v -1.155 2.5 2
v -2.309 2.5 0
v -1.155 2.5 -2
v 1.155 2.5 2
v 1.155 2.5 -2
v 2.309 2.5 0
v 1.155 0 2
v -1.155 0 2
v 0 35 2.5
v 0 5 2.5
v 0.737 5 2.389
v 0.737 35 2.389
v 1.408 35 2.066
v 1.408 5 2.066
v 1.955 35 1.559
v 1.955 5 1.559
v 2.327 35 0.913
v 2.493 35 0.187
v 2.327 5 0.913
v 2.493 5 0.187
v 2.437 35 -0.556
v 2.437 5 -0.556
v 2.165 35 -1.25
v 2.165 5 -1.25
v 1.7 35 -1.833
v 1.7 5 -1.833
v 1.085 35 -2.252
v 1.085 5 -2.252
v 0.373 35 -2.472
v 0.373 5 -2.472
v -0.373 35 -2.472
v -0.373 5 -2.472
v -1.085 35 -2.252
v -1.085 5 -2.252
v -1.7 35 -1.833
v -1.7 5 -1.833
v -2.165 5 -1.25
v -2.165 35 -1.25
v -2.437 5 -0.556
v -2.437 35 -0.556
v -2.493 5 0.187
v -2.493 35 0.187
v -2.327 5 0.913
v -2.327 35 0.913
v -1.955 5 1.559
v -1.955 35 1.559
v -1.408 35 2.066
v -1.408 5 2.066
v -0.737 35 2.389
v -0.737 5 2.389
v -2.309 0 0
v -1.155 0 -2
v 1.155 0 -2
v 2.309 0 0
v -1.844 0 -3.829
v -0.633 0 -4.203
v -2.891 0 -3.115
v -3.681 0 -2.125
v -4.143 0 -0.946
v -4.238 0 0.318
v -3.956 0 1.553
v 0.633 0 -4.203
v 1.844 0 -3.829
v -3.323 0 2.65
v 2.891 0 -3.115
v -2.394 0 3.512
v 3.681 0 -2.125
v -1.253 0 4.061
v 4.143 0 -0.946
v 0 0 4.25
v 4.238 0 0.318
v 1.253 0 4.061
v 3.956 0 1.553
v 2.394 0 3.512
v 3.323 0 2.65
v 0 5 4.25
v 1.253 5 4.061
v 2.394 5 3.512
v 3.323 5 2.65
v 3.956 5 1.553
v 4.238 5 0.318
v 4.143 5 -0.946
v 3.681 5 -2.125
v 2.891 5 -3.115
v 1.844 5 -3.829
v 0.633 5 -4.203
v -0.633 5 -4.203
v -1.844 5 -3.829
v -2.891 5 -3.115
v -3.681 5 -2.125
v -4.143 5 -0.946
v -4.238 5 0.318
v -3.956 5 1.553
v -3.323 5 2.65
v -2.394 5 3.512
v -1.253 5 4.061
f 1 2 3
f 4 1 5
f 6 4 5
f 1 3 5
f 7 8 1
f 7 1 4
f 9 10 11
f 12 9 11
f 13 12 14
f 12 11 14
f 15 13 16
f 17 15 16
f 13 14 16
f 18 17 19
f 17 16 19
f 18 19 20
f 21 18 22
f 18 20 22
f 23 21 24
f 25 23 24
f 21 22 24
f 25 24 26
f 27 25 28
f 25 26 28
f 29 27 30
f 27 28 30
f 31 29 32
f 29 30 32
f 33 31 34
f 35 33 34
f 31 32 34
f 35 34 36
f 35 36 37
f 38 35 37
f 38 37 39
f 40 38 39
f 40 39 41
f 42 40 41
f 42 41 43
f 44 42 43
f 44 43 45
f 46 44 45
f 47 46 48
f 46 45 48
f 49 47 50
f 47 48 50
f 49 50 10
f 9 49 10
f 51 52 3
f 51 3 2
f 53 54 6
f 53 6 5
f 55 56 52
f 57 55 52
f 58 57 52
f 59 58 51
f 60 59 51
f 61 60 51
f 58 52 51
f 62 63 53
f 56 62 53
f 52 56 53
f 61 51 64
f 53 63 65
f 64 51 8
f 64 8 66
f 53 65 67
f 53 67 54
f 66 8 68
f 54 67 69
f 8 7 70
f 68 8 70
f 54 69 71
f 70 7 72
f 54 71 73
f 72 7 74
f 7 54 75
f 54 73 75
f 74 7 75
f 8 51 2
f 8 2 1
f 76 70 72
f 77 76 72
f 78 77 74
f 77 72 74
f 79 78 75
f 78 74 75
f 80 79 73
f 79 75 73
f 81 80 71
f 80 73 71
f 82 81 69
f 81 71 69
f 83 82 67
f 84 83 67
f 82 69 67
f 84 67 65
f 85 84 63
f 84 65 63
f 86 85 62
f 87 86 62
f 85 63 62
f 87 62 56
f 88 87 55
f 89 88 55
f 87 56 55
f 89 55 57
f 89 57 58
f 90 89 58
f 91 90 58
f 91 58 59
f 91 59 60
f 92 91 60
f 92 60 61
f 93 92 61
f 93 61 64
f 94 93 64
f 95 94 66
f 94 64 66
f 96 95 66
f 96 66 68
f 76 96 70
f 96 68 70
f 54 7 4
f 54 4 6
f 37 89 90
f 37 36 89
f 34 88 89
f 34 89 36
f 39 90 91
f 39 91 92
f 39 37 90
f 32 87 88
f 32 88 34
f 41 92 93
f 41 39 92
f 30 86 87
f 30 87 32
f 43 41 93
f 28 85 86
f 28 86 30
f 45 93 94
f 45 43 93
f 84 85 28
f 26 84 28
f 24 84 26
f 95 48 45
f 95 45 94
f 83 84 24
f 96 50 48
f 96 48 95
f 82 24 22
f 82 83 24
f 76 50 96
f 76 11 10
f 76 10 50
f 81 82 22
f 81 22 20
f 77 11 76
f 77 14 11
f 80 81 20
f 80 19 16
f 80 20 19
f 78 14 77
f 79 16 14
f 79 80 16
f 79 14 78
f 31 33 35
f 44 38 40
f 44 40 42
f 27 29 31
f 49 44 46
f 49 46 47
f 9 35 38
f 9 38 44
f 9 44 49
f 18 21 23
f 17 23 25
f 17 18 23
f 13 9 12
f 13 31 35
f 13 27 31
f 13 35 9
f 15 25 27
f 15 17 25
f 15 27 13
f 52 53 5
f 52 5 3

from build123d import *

# Parameters (mm, degrees)
SKETCH_1_R          = 4.25
EXTRUDE_1_DEPTH     = 5
EXTRUDE_START       = 5
SKETCH_2_R          = 2.5
EXTRUDE_2_DEPTH     = 30
CUT_EXTRUDE_1_DEPTH = 2.5


with BuildPart() as part:
    # 草图1 → 凸台-拉伸1 (new body)
    with BuildSketch(Plane(origin=(0, 0, 0), x_dir=(1, 0, 0), z_dir=(0, 1, 0))):
        with Locations(Location((0, 0, 0), (0, 0, 270))):
            Circle(SKETCH_1_R)
    extrude(amount=EXTRUDE_1_DEPTH)

    # 草图2 → 凸台-拉伸2 (add)
    with BuildSketch(Plane(origin=(0, 0, 0), x_dir=(1, 0, 0), z_dir=(0, 1, 0)).offset(EXTRUDE_START)):
        with Locations(Location((0, 0, 0), (0, 0, 270))):
            Circle(SKETCH_2_R)
    extrude(amount=EXTRUDE_2_DEPTH)

    # 草图4 → 切除-拉伸1 (cut)
    with BuildSketch(Plane(origin=(0, 0, 0), x_dir=(1, 0, 0), z_dir=(0, 1, 0))):
        Polygon((2.309401077, 0), (1.154700538, 2), (-1.154700538, 2), (-2.309401077, 0), (-1.154700538, -2), (1.154700538, -2), align=None)
    extrude(amount=CUT_EXTRUDE_1_DEPTH, mode=Mode.SUBTRACT)


solid = part.part
